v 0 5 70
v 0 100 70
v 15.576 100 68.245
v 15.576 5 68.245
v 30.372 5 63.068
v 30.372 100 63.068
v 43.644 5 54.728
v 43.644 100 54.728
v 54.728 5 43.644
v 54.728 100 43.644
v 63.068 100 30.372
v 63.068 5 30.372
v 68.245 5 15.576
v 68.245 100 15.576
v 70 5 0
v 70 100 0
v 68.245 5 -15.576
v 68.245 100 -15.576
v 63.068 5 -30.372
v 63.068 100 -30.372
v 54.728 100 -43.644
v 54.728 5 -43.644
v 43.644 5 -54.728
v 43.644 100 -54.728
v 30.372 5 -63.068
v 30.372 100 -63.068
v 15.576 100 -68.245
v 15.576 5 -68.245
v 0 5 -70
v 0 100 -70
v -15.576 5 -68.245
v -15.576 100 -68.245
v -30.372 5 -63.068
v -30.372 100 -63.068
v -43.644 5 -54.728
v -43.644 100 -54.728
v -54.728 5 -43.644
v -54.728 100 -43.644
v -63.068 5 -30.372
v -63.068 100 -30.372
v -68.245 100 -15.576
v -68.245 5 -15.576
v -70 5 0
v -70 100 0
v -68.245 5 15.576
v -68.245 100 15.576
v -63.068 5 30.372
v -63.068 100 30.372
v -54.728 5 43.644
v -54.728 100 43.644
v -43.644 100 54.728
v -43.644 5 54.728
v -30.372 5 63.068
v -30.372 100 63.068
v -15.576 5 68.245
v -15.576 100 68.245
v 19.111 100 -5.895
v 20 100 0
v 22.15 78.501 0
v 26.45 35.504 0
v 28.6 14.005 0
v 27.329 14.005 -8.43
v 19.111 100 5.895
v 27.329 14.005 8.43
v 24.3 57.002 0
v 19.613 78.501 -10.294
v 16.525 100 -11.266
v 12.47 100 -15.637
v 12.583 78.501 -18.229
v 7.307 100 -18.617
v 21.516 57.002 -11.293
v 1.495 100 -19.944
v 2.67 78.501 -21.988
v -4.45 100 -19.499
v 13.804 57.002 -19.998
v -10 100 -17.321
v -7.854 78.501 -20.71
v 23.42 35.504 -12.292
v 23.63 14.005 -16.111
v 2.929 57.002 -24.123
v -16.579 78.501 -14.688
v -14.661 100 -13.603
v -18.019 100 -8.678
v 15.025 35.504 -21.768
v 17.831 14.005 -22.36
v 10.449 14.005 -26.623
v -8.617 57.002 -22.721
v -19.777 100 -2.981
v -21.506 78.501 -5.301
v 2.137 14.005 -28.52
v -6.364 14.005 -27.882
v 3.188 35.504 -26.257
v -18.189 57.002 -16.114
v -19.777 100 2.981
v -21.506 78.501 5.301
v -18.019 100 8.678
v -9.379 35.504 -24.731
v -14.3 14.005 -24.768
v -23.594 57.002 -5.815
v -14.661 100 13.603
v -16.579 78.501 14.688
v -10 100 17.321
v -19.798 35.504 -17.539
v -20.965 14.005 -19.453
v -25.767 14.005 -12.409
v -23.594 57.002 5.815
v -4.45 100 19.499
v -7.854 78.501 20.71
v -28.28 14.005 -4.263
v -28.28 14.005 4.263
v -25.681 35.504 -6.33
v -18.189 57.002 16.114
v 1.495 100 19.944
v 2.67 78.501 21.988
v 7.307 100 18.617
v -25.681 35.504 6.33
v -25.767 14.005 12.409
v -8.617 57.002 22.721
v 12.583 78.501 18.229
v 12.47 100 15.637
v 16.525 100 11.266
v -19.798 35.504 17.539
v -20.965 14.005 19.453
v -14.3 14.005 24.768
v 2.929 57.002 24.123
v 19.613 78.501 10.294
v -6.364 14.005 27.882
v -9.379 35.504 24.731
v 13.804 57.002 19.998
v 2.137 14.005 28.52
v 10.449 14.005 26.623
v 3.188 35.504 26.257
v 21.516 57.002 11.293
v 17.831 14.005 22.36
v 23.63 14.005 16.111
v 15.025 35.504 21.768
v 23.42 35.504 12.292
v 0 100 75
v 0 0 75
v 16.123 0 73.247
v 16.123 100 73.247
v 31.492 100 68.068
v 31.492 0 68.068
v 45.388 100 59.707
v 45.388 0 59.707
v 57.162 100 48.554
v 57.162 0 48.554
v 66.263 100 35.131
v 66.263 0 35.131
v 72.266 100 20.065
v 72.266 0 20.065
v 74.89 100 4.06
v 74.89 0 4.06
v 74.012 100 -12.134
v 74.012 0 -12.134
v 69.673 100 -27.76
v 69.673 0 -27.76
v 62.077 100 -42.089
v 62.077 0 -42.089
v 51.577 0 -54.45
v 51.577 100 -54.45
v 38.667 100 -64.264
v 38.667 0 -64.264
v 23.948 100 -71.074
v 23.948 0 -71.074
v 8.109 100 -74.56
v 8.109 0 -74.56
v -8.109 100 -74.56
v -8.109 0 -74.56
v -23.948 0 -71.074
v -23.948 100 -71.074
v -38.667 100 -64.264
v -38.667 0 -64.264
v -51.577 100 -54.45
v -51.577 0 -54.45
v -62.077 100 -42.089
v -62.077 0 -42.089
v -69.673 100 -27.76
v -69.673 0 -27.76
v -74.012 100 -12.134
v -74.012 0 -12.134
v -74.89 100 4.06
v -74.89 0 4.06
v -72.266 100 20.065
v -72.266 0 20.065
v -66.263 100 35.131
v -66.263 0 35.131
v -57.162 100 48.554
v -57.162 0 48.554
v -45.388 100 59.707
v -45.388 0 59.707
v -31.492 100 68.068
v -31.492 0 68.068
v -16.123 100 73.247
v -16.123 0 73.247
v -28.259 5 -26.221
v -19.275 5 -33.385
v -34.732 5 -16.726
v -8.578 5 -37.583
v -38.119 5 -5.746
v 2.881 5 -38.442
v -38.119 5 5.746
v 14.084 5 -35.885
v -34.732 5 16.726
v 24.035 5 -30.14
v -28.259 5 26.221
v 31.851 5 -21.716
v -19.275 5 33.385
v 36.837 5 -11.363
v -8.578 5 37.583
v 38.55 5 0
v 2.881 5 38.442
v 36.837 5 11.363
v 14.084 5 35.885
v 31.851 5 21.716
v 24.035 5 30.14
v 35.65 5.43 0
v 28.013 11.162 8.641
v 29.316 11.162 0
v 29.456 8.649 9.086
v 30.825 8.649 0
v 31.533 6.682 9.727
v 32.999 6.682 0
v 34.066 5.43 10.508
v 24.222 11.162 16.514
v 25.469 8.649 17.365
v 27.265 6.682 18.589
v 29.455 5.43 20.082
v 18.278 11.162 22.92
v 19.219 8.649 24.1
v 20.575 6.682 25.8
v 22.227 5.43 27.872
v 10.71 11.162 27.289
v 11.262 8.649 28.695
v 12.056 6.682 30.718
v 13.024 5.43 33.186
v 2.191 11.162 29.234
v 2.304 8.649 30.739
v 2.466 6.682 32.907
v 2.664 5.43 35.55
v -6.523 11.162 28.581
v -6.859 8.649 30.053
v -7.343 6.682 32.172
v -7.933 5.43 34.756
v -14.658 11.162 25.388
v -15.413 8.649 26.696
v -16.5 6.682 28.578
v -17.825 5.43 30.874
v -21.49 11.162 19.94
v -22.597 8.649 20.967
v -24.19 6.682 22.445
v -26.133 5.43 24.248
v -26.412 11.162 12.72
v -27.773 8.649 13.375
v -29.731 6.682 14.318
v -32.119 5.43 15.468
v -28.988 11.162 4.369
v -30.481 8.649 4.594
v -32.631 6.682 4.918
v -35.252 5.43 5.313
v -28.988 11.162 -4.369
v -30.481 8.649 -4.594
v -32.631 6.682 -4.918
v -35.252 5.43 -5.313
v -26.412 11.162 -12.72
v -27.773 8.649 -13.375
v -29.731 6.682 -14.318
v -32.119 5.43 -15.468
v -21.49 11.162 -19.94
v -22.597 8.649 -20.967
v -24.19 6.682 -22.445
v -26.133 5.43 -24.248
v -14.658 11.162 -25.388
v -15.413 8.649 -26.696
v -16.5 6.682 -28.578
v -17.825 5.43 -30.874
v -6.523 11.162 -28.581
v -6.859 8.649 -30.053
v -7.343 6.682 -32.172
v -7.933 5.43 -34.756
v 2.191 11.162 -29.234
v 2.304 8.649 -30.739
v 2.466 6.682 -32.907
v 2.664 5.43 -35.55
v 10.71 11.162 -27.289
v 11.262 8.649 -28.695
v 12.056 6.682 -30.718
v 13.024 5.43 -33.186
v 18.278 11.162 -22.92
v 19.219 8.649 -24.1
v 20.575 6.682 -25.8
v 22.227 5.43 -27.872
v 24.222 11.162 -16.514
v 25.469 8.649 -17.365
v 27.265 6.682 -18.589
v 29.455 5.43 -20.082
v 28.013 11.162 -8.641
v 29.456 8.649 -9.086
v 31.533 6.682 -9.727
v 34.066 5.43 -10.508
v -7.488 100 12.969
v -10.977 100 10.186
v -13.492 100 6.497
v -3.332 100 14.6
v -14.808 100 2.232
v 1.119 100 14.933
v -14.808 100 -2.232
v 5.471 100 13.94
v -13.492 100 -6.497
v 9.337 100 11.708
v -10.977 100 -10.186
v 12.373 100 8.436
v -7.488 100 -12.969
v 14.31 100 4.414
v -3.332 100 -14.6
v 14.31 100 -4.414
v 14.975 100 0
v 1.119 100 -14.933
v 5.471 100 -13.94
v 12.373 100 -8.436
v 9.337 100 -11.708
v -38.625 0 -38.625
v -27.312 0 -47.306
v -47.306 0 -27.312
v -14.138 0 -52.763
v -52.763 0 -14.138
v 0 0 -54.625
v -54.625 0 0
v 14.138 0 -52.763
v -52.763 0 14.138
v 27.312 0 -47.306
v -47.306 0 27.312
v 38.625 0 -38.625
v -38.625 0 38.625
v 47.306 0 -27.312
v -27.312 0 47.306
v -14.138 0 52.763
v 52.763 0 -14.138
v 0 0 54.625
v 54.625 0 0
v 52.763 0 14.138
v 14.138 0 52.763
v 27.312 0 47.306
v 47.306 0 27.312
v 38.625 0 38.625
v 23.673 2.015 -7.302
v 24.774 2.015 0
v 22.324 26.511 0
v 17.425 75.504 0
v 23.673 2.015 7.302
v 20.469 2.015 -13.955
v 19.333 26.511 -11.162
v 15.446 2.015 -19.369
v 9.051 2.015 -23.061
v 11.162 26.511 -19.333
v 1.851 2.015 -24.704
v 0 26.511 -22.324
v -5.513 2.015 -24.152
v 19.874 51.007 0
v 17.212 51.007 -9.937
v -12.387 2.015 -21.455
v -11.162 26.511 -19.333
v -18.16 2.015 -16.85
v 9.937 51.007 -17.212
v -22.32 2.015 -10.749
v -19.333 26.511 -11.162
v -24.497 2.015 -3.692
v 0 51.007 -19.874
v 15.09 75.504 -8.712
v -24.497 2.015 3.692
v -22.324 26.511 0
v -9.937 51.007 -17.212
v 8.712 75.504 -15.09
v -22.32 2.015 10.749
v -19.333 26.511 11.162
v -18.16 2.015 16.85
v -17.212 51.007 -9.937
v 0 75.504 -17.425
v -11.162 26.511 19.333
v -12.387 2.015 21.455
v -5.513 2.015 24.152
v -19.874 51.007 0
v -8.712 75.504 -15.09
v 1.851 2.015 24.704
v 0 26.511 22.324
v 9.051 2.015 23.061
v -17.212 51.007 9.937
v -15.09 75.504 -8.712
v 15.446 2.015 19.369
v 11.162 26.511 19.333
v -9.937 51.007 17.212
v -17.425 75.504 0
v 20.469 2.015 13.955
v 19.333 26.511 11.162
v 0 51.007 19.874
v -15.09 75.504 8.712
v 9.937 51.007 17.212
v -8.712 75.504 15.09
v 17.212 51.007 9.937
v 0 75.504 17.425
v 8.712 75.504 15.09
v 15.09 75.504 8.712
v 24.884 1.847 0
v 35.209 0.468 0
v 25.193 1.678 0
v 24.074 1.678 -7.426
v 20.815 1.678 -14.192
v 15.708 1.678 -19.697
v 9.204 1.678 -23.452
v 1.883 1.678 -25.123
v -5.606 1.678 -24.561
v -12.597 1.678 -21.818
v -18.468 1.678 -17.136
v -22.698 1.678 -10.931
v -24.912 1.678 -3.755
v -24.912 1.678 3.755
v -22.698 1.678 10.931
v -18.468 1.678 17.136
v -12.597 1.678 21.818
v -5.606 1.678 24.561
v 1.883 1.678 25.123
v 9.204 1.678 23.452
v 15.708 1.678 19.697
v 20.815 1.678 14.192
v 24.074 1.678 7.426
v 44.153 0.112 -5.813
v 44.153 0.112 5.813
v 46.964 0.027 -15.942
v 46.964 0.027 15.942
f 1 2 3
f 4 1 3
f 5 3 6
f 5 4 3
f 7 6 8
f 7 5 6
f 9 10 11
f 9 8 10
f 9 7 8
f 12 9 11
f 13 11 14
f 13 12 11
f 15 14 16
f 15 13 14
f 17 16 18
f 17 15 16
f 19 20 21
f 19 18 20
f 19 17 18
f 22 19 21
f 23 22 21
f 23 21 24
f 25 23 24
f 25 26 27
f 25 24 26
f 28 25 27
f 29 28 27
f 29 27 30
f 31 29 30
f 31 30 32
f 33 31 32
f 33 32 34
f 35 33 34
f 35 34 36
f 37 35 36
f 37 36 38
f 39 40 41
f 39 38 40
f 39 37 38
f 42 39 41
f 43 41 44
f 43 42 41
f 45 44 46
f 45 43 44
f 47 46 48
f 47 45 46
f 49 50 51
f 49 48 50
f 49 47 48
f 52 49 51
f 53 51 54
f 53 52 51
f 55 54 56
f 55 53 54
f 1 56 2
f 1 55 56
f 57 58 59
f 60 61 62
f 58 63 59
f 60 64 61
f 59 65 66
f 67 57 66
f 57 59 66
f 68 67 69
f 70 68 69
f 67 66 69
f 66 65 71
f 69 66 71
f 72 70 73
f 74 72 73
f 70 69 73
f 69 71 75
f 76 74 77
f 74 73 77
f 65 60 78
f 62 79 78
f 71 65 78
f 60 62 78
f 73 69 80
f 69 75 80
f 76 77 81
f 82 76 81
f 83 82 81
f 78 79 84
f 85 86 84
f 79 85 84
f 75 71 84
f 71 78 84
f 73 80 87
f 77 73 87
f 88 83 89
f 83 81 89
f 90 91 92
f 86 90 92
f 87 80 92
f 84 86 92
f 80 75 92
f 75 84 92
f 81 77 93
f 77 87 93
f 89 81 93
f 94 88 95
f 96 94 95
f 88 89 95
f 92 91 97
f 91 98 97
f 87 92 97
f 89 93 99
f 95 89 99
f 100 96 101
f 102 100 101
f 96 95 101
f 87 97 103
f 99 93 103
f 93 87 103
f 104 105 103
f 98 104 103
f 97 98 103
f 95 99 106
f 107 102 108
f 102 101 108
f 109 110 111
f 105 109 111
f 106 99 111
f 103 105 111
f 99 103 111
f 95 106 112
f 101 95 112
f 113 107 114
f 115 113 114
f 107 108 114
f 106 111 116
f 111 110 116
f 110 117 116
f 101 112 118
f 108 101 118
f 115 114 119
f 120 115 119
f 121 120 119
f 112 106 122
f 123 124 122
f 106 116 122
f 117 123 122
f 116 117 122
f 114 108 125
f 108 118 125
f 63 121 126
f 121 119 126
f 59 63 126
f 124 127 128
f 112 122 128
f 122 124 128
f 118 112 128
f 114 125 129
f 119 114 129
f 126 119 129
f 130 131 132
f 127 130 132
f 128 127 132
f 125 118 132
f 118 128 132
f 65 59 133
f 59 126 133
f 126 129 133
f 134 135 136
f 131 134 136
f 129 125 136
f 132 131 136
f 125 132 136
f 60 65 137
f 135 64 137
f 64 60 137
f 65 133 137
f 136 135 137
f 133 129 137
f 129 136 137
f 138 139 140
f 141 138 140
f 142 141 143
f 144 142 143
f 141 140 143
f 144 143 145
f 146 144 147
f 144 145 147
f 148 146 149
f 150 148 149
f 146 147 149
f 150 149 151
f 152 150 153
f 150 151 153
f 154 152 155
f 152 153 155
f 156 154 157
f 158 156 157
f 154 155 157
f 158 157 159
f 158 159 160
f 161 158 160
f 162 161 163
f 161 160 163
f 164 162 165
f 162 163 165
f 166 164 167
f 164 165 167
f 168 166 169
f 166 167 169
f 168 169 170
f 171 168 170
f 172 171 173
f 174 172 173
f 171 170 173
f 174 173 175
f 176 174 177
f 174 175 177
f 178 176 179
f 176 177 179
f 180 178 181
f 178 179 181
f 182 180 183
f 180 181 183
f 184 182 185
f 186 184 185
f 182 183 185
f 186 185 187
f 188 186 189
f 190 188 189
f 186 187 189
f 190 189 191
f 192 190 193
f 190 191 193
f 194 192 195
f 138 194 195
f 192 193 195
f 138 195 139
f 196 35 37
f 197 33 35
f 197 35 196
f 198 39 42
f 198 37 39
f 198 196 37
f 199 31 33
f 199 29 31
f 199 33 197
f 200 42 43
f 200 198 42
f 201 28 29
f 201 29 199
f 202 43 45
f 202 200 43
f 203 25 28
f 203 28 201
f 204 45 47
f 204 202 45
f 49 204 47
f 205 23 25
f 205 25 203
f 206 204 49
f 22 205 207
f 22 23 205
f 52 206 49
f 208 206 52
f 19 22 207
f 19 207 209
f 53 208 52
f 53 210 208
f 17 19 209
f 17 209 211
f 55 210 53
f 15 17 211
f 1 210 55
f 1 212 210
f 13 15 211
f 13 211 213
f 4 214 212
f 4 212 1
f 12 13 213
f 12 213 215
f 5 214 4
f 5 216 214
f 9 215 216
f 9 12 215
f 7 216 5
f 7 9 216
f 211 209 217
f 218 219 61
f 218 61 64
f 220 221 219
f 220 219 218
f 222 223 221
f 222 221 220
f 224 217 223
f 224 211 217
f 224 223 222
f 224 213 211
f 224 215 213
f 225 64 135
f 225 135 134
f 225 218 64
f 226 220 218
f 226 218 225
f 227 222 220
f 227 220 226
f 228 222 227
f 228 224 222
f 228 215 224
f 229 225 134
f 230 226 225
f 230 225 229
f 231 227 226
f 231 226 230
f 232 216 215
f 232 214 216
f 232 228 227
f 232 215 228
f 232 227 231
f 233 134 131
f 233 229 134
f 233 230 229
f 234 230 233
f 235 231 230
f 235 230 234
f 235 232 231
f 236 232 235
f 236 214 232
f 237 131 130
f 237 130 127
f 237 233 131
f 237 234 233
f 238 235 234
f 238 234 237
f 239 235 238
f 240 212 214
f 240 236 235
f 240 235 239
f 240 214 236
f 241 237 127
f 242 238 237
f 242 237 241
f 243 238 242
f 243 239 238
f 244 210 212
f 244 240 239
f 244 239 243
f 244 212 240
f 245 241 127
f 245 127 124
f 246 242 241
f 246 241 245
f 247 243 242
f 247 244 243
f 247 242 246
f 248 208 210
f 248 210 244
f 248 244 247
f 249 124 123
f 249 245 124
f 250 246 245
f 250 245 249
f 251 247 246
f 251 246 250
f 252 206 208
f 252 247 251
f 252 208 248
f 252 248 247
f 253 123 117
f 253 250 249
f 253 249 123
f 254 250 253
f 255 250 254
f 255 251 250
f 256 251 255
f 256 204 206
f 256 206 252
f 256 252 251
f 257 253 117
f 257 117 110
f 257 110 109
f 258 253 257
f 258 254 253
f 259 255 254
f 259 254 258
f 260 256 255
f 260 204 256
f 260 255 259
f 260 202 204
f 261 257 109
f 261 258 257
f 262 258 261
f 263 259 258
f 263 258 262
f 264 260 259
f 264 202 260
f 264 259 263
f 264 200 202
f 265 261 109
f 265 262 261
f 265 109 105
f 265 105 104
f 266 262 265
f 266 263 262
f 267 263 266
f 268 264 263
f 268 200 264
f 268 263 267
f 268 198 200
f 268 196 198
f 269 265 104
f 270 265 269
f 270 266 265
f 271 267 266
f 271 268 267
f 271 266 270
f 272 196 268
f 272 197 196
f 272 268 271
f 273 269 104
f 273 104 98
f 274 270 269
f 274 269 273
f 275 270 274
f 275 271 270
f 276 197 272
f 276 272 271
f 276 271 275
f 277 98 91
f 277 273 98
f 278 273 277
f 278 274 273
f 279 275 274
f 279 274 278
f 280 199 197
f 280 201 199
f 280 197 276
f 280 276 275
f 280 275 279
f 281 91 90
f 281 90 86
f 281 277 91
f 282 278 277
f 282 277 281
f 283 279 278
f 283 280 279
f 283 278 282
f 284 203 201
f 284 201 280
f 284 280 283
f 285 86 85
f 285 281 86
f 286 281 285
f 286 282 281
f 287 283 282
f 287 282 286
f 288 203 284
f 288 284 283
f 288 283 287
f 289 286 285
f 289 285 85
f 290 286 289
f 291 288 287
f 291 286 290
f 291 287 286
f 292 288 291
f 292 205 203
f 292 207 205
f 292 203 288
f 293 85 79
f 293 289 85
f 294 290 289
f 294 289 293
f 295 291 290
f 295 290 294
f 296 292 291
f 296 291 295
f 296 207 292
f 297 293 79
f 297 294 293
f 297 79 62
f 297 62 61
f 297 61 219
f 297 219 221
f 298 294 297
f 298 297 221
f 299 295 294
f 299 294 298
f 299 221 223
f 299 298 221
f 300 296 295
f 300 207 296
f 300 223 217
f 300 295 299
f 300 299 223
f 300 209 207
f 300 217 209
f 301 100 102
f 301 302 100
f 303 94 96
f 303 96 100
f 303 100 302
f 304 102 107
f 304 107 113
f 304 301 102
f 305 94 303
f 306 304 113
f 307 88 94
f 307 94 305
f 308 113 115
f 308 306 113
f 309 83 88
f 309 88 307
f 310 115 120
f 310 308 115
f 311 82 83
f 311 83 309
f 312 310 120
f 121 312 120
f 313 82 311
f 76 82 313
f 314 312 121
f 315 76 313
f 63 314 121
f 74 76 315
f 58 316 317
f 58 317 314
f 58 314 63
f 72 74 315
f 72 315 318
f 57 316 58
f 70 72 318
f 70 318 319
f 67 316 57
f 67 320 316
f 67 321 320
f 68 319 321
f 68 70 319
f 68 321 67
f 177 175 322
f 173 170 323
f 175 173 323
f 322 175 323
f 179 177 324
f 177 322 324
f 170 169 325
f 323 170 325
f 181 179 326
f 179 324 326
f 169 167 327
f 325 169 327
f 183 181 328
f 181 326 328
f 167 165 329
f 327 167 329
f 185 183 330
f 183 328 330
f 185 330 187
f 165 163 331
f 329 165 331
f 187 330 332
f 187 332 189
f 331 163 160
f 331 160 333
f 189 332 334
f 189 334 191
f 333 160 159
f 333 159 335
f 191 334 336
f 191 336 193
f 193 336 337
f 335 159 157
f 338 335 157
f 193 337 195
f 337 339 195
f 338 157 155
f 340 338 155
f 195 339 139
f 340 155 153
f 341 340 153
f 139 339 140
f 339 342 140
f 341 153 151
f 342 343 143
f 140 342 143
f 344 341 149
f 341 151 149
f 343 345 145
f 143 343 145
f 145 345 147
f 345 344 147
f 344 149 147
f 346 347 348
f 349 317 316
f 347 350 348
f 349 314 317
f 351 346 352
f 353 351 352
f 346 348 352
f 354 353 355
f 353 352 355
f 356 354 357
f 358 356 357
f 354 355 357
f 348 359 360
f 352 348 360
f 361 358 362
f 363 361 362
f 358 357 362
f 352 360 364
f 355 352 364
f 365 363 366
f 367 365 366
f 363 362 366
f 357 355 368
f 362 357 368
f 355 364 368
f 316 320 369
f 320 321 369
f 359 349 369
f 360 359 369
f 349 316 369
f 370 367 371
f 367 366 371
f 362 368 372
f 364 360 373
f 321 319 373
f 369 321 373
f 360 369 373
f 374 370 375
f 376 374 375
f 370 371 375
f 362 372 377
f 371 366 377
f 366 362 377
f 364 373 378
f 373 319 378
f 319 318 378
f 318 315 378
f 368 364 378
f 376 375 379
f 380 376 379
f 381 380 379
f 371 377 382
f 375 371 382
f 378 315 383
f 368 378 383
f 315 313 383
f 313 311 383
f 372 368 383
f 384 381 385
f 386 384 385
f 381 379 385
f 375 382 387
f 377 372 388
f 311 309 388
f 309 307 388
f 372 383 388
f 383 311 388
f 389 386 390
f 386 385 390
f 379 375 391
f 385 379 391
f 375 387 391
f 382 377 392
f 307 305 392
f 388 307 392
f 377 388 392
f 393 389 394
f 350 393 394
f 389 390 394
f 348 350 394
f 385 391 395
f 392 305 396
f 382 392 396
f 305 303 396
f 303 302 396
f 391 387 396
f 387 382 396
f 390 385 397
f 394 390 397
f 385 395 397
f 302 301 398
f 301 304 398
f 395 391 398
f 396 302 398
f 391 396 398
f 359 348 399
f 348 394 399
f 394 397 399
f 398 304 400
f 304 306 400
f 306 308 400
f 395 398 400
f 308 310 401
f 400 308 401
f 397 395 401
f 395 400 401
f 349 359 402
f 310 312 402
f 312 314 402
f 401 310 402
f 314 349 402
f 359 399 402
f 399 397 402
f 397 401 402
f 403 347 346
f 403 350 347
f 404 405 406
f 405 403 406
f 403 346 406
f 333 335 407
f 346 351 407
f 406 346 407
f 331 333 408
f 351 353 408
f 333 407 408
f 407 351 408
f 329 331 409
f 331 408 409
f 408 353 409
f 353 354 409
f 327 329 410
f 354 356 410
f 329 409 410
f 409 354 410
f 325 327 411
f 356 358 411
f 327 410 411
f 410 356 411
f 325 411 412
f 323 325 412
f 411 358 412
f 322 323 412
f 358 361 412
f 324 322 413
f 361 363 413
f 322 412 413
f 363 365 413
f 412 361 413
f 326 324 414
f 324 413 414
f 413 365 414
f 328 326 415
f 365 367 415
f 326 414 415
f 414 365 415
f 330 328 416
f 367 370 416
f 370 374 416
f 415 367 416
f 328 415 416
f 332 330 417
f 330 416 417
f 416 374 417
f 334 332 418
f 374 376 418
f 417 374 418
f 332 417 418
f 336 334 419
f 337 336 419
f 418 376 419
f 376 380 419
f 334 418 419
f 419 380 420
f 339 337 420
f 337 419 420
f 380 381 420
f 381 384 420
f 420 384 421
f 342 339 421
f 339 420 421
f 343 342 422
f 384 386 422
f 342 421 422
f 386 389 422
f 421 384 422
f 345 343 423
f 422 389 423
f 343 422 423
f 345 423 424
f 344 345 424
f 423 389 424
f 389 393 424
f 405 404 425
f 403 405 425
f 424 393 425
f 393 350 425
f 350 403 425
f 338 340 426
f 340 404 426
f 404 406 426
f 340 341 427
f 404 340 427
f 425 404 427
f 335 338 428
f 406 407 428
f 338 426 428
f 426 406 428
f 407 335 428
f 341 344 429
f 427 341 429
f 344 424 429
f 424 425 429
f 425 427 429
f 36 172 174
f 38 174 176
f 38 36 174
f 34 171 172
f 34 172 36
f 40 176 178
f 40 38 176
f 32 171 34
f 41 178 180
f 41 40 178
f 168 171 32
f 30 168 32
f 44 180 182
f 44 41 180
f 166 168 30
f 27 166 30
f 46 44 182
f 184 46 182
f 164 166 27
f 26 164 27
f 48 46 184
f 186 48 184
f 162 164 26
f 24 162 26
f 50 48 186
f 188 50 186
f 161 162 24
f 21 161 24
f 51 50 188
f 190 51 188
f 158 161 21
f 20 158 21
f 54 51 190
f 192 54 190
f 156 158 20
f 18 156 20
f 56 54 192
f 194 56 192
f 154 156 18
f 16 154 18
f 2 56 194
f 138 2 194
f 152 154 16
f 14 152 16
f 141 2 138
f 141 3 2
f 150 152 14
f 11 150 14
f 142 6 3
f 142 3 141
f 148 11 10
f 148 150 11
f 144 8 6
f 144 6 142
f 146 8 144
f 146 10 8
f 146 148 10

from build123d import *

# Parameters (mm, degrees)
SKETCH1_R           = 75
BOSS_EXTRUDE1_DEPTH = 100
SHELL1_T            = -5
SKETCH3_R           = 20
SKETCH2_R           = 30
FILLET2_R           = 10


# Read off the part's stored shape, not the designer's step: Shell2
with BuildPart() as part:
    # Sketch1 → Boss-Extrude1 (new body)
    with BuildSketch(Plane(origin=(0, 0, 0), x_dir=(1, 0, 0), z_dir=(0, 1, 0))):
        with Locations(Location((0, 0, 0), (0, 0, 270))):
            Circle(SKETCH1_R)
    extrude(amount=BOSS_EXTRUDE1_DEPTH)

    # Shell1
    shell1_openings = [part.faces().sort_by_distance(p)[0] for p in [
        (0, 100, 0),
    ]]
    offset(amount=SHELL1_T, openings=shell1_openings, kind=Kind.INTERSECTION)

    # Sketch3 → Loft1 section 0
    with BuildSketch(Plane(origin=(0, 100, 0), x_dir=(1, 0, 0), z_dir=(0, 1, 0))):
        Circle(SKETCH3_R)
    # Sketch2 → Loft1 section 1
    with BuildSketch(Plane.XZ):
        Circle(SKETCH2_R)
    loft()

    # Shell2 outline → Shell2 (revolve, cut)
    with BuildSketch(Plane.XY):
        Polygon((0, 0), (24.975062189, 0), (14.975062189, 100), (0, 100), align=None)
    revolve(axis=Axis((0, 0, 0), (0, 1, 0)), mode=Mode.SUBTRACT)

    # Fillet1
    # an asymmetric fillet: 30, 5 mm, written as the material it takes off along each edge
    with BuildSketch(Plane(origin=(0, 0, 0), x_dir=(1, 0, 0), z_dir=(0, 0, 1))) as fillet1_piece_1:
        with BuildLine():
            Bezier((54.624689052, 0), (24.975062189, 0), (24.773573346, 2.014888429), weights=[1, 0.741452534, 1])
            Line((24.773573346, 2.014888429), (24.975062189, 0))
            Line((24.975062189, 0), (54.624689052, 0))
        make_face()
    revolve(axis=Axis((0, 0, 0), (0, 1, 0)), mode=Mode.SUBTRACT)

    # Fillet2
    fillet2_edges = [part.edges().sort_by_distance(p)[0] for p in [
        (-29.5, 5, 0),
    ]]
    fillet(fillet2_edges, radius=FILLET2_R)


solid = part.part
